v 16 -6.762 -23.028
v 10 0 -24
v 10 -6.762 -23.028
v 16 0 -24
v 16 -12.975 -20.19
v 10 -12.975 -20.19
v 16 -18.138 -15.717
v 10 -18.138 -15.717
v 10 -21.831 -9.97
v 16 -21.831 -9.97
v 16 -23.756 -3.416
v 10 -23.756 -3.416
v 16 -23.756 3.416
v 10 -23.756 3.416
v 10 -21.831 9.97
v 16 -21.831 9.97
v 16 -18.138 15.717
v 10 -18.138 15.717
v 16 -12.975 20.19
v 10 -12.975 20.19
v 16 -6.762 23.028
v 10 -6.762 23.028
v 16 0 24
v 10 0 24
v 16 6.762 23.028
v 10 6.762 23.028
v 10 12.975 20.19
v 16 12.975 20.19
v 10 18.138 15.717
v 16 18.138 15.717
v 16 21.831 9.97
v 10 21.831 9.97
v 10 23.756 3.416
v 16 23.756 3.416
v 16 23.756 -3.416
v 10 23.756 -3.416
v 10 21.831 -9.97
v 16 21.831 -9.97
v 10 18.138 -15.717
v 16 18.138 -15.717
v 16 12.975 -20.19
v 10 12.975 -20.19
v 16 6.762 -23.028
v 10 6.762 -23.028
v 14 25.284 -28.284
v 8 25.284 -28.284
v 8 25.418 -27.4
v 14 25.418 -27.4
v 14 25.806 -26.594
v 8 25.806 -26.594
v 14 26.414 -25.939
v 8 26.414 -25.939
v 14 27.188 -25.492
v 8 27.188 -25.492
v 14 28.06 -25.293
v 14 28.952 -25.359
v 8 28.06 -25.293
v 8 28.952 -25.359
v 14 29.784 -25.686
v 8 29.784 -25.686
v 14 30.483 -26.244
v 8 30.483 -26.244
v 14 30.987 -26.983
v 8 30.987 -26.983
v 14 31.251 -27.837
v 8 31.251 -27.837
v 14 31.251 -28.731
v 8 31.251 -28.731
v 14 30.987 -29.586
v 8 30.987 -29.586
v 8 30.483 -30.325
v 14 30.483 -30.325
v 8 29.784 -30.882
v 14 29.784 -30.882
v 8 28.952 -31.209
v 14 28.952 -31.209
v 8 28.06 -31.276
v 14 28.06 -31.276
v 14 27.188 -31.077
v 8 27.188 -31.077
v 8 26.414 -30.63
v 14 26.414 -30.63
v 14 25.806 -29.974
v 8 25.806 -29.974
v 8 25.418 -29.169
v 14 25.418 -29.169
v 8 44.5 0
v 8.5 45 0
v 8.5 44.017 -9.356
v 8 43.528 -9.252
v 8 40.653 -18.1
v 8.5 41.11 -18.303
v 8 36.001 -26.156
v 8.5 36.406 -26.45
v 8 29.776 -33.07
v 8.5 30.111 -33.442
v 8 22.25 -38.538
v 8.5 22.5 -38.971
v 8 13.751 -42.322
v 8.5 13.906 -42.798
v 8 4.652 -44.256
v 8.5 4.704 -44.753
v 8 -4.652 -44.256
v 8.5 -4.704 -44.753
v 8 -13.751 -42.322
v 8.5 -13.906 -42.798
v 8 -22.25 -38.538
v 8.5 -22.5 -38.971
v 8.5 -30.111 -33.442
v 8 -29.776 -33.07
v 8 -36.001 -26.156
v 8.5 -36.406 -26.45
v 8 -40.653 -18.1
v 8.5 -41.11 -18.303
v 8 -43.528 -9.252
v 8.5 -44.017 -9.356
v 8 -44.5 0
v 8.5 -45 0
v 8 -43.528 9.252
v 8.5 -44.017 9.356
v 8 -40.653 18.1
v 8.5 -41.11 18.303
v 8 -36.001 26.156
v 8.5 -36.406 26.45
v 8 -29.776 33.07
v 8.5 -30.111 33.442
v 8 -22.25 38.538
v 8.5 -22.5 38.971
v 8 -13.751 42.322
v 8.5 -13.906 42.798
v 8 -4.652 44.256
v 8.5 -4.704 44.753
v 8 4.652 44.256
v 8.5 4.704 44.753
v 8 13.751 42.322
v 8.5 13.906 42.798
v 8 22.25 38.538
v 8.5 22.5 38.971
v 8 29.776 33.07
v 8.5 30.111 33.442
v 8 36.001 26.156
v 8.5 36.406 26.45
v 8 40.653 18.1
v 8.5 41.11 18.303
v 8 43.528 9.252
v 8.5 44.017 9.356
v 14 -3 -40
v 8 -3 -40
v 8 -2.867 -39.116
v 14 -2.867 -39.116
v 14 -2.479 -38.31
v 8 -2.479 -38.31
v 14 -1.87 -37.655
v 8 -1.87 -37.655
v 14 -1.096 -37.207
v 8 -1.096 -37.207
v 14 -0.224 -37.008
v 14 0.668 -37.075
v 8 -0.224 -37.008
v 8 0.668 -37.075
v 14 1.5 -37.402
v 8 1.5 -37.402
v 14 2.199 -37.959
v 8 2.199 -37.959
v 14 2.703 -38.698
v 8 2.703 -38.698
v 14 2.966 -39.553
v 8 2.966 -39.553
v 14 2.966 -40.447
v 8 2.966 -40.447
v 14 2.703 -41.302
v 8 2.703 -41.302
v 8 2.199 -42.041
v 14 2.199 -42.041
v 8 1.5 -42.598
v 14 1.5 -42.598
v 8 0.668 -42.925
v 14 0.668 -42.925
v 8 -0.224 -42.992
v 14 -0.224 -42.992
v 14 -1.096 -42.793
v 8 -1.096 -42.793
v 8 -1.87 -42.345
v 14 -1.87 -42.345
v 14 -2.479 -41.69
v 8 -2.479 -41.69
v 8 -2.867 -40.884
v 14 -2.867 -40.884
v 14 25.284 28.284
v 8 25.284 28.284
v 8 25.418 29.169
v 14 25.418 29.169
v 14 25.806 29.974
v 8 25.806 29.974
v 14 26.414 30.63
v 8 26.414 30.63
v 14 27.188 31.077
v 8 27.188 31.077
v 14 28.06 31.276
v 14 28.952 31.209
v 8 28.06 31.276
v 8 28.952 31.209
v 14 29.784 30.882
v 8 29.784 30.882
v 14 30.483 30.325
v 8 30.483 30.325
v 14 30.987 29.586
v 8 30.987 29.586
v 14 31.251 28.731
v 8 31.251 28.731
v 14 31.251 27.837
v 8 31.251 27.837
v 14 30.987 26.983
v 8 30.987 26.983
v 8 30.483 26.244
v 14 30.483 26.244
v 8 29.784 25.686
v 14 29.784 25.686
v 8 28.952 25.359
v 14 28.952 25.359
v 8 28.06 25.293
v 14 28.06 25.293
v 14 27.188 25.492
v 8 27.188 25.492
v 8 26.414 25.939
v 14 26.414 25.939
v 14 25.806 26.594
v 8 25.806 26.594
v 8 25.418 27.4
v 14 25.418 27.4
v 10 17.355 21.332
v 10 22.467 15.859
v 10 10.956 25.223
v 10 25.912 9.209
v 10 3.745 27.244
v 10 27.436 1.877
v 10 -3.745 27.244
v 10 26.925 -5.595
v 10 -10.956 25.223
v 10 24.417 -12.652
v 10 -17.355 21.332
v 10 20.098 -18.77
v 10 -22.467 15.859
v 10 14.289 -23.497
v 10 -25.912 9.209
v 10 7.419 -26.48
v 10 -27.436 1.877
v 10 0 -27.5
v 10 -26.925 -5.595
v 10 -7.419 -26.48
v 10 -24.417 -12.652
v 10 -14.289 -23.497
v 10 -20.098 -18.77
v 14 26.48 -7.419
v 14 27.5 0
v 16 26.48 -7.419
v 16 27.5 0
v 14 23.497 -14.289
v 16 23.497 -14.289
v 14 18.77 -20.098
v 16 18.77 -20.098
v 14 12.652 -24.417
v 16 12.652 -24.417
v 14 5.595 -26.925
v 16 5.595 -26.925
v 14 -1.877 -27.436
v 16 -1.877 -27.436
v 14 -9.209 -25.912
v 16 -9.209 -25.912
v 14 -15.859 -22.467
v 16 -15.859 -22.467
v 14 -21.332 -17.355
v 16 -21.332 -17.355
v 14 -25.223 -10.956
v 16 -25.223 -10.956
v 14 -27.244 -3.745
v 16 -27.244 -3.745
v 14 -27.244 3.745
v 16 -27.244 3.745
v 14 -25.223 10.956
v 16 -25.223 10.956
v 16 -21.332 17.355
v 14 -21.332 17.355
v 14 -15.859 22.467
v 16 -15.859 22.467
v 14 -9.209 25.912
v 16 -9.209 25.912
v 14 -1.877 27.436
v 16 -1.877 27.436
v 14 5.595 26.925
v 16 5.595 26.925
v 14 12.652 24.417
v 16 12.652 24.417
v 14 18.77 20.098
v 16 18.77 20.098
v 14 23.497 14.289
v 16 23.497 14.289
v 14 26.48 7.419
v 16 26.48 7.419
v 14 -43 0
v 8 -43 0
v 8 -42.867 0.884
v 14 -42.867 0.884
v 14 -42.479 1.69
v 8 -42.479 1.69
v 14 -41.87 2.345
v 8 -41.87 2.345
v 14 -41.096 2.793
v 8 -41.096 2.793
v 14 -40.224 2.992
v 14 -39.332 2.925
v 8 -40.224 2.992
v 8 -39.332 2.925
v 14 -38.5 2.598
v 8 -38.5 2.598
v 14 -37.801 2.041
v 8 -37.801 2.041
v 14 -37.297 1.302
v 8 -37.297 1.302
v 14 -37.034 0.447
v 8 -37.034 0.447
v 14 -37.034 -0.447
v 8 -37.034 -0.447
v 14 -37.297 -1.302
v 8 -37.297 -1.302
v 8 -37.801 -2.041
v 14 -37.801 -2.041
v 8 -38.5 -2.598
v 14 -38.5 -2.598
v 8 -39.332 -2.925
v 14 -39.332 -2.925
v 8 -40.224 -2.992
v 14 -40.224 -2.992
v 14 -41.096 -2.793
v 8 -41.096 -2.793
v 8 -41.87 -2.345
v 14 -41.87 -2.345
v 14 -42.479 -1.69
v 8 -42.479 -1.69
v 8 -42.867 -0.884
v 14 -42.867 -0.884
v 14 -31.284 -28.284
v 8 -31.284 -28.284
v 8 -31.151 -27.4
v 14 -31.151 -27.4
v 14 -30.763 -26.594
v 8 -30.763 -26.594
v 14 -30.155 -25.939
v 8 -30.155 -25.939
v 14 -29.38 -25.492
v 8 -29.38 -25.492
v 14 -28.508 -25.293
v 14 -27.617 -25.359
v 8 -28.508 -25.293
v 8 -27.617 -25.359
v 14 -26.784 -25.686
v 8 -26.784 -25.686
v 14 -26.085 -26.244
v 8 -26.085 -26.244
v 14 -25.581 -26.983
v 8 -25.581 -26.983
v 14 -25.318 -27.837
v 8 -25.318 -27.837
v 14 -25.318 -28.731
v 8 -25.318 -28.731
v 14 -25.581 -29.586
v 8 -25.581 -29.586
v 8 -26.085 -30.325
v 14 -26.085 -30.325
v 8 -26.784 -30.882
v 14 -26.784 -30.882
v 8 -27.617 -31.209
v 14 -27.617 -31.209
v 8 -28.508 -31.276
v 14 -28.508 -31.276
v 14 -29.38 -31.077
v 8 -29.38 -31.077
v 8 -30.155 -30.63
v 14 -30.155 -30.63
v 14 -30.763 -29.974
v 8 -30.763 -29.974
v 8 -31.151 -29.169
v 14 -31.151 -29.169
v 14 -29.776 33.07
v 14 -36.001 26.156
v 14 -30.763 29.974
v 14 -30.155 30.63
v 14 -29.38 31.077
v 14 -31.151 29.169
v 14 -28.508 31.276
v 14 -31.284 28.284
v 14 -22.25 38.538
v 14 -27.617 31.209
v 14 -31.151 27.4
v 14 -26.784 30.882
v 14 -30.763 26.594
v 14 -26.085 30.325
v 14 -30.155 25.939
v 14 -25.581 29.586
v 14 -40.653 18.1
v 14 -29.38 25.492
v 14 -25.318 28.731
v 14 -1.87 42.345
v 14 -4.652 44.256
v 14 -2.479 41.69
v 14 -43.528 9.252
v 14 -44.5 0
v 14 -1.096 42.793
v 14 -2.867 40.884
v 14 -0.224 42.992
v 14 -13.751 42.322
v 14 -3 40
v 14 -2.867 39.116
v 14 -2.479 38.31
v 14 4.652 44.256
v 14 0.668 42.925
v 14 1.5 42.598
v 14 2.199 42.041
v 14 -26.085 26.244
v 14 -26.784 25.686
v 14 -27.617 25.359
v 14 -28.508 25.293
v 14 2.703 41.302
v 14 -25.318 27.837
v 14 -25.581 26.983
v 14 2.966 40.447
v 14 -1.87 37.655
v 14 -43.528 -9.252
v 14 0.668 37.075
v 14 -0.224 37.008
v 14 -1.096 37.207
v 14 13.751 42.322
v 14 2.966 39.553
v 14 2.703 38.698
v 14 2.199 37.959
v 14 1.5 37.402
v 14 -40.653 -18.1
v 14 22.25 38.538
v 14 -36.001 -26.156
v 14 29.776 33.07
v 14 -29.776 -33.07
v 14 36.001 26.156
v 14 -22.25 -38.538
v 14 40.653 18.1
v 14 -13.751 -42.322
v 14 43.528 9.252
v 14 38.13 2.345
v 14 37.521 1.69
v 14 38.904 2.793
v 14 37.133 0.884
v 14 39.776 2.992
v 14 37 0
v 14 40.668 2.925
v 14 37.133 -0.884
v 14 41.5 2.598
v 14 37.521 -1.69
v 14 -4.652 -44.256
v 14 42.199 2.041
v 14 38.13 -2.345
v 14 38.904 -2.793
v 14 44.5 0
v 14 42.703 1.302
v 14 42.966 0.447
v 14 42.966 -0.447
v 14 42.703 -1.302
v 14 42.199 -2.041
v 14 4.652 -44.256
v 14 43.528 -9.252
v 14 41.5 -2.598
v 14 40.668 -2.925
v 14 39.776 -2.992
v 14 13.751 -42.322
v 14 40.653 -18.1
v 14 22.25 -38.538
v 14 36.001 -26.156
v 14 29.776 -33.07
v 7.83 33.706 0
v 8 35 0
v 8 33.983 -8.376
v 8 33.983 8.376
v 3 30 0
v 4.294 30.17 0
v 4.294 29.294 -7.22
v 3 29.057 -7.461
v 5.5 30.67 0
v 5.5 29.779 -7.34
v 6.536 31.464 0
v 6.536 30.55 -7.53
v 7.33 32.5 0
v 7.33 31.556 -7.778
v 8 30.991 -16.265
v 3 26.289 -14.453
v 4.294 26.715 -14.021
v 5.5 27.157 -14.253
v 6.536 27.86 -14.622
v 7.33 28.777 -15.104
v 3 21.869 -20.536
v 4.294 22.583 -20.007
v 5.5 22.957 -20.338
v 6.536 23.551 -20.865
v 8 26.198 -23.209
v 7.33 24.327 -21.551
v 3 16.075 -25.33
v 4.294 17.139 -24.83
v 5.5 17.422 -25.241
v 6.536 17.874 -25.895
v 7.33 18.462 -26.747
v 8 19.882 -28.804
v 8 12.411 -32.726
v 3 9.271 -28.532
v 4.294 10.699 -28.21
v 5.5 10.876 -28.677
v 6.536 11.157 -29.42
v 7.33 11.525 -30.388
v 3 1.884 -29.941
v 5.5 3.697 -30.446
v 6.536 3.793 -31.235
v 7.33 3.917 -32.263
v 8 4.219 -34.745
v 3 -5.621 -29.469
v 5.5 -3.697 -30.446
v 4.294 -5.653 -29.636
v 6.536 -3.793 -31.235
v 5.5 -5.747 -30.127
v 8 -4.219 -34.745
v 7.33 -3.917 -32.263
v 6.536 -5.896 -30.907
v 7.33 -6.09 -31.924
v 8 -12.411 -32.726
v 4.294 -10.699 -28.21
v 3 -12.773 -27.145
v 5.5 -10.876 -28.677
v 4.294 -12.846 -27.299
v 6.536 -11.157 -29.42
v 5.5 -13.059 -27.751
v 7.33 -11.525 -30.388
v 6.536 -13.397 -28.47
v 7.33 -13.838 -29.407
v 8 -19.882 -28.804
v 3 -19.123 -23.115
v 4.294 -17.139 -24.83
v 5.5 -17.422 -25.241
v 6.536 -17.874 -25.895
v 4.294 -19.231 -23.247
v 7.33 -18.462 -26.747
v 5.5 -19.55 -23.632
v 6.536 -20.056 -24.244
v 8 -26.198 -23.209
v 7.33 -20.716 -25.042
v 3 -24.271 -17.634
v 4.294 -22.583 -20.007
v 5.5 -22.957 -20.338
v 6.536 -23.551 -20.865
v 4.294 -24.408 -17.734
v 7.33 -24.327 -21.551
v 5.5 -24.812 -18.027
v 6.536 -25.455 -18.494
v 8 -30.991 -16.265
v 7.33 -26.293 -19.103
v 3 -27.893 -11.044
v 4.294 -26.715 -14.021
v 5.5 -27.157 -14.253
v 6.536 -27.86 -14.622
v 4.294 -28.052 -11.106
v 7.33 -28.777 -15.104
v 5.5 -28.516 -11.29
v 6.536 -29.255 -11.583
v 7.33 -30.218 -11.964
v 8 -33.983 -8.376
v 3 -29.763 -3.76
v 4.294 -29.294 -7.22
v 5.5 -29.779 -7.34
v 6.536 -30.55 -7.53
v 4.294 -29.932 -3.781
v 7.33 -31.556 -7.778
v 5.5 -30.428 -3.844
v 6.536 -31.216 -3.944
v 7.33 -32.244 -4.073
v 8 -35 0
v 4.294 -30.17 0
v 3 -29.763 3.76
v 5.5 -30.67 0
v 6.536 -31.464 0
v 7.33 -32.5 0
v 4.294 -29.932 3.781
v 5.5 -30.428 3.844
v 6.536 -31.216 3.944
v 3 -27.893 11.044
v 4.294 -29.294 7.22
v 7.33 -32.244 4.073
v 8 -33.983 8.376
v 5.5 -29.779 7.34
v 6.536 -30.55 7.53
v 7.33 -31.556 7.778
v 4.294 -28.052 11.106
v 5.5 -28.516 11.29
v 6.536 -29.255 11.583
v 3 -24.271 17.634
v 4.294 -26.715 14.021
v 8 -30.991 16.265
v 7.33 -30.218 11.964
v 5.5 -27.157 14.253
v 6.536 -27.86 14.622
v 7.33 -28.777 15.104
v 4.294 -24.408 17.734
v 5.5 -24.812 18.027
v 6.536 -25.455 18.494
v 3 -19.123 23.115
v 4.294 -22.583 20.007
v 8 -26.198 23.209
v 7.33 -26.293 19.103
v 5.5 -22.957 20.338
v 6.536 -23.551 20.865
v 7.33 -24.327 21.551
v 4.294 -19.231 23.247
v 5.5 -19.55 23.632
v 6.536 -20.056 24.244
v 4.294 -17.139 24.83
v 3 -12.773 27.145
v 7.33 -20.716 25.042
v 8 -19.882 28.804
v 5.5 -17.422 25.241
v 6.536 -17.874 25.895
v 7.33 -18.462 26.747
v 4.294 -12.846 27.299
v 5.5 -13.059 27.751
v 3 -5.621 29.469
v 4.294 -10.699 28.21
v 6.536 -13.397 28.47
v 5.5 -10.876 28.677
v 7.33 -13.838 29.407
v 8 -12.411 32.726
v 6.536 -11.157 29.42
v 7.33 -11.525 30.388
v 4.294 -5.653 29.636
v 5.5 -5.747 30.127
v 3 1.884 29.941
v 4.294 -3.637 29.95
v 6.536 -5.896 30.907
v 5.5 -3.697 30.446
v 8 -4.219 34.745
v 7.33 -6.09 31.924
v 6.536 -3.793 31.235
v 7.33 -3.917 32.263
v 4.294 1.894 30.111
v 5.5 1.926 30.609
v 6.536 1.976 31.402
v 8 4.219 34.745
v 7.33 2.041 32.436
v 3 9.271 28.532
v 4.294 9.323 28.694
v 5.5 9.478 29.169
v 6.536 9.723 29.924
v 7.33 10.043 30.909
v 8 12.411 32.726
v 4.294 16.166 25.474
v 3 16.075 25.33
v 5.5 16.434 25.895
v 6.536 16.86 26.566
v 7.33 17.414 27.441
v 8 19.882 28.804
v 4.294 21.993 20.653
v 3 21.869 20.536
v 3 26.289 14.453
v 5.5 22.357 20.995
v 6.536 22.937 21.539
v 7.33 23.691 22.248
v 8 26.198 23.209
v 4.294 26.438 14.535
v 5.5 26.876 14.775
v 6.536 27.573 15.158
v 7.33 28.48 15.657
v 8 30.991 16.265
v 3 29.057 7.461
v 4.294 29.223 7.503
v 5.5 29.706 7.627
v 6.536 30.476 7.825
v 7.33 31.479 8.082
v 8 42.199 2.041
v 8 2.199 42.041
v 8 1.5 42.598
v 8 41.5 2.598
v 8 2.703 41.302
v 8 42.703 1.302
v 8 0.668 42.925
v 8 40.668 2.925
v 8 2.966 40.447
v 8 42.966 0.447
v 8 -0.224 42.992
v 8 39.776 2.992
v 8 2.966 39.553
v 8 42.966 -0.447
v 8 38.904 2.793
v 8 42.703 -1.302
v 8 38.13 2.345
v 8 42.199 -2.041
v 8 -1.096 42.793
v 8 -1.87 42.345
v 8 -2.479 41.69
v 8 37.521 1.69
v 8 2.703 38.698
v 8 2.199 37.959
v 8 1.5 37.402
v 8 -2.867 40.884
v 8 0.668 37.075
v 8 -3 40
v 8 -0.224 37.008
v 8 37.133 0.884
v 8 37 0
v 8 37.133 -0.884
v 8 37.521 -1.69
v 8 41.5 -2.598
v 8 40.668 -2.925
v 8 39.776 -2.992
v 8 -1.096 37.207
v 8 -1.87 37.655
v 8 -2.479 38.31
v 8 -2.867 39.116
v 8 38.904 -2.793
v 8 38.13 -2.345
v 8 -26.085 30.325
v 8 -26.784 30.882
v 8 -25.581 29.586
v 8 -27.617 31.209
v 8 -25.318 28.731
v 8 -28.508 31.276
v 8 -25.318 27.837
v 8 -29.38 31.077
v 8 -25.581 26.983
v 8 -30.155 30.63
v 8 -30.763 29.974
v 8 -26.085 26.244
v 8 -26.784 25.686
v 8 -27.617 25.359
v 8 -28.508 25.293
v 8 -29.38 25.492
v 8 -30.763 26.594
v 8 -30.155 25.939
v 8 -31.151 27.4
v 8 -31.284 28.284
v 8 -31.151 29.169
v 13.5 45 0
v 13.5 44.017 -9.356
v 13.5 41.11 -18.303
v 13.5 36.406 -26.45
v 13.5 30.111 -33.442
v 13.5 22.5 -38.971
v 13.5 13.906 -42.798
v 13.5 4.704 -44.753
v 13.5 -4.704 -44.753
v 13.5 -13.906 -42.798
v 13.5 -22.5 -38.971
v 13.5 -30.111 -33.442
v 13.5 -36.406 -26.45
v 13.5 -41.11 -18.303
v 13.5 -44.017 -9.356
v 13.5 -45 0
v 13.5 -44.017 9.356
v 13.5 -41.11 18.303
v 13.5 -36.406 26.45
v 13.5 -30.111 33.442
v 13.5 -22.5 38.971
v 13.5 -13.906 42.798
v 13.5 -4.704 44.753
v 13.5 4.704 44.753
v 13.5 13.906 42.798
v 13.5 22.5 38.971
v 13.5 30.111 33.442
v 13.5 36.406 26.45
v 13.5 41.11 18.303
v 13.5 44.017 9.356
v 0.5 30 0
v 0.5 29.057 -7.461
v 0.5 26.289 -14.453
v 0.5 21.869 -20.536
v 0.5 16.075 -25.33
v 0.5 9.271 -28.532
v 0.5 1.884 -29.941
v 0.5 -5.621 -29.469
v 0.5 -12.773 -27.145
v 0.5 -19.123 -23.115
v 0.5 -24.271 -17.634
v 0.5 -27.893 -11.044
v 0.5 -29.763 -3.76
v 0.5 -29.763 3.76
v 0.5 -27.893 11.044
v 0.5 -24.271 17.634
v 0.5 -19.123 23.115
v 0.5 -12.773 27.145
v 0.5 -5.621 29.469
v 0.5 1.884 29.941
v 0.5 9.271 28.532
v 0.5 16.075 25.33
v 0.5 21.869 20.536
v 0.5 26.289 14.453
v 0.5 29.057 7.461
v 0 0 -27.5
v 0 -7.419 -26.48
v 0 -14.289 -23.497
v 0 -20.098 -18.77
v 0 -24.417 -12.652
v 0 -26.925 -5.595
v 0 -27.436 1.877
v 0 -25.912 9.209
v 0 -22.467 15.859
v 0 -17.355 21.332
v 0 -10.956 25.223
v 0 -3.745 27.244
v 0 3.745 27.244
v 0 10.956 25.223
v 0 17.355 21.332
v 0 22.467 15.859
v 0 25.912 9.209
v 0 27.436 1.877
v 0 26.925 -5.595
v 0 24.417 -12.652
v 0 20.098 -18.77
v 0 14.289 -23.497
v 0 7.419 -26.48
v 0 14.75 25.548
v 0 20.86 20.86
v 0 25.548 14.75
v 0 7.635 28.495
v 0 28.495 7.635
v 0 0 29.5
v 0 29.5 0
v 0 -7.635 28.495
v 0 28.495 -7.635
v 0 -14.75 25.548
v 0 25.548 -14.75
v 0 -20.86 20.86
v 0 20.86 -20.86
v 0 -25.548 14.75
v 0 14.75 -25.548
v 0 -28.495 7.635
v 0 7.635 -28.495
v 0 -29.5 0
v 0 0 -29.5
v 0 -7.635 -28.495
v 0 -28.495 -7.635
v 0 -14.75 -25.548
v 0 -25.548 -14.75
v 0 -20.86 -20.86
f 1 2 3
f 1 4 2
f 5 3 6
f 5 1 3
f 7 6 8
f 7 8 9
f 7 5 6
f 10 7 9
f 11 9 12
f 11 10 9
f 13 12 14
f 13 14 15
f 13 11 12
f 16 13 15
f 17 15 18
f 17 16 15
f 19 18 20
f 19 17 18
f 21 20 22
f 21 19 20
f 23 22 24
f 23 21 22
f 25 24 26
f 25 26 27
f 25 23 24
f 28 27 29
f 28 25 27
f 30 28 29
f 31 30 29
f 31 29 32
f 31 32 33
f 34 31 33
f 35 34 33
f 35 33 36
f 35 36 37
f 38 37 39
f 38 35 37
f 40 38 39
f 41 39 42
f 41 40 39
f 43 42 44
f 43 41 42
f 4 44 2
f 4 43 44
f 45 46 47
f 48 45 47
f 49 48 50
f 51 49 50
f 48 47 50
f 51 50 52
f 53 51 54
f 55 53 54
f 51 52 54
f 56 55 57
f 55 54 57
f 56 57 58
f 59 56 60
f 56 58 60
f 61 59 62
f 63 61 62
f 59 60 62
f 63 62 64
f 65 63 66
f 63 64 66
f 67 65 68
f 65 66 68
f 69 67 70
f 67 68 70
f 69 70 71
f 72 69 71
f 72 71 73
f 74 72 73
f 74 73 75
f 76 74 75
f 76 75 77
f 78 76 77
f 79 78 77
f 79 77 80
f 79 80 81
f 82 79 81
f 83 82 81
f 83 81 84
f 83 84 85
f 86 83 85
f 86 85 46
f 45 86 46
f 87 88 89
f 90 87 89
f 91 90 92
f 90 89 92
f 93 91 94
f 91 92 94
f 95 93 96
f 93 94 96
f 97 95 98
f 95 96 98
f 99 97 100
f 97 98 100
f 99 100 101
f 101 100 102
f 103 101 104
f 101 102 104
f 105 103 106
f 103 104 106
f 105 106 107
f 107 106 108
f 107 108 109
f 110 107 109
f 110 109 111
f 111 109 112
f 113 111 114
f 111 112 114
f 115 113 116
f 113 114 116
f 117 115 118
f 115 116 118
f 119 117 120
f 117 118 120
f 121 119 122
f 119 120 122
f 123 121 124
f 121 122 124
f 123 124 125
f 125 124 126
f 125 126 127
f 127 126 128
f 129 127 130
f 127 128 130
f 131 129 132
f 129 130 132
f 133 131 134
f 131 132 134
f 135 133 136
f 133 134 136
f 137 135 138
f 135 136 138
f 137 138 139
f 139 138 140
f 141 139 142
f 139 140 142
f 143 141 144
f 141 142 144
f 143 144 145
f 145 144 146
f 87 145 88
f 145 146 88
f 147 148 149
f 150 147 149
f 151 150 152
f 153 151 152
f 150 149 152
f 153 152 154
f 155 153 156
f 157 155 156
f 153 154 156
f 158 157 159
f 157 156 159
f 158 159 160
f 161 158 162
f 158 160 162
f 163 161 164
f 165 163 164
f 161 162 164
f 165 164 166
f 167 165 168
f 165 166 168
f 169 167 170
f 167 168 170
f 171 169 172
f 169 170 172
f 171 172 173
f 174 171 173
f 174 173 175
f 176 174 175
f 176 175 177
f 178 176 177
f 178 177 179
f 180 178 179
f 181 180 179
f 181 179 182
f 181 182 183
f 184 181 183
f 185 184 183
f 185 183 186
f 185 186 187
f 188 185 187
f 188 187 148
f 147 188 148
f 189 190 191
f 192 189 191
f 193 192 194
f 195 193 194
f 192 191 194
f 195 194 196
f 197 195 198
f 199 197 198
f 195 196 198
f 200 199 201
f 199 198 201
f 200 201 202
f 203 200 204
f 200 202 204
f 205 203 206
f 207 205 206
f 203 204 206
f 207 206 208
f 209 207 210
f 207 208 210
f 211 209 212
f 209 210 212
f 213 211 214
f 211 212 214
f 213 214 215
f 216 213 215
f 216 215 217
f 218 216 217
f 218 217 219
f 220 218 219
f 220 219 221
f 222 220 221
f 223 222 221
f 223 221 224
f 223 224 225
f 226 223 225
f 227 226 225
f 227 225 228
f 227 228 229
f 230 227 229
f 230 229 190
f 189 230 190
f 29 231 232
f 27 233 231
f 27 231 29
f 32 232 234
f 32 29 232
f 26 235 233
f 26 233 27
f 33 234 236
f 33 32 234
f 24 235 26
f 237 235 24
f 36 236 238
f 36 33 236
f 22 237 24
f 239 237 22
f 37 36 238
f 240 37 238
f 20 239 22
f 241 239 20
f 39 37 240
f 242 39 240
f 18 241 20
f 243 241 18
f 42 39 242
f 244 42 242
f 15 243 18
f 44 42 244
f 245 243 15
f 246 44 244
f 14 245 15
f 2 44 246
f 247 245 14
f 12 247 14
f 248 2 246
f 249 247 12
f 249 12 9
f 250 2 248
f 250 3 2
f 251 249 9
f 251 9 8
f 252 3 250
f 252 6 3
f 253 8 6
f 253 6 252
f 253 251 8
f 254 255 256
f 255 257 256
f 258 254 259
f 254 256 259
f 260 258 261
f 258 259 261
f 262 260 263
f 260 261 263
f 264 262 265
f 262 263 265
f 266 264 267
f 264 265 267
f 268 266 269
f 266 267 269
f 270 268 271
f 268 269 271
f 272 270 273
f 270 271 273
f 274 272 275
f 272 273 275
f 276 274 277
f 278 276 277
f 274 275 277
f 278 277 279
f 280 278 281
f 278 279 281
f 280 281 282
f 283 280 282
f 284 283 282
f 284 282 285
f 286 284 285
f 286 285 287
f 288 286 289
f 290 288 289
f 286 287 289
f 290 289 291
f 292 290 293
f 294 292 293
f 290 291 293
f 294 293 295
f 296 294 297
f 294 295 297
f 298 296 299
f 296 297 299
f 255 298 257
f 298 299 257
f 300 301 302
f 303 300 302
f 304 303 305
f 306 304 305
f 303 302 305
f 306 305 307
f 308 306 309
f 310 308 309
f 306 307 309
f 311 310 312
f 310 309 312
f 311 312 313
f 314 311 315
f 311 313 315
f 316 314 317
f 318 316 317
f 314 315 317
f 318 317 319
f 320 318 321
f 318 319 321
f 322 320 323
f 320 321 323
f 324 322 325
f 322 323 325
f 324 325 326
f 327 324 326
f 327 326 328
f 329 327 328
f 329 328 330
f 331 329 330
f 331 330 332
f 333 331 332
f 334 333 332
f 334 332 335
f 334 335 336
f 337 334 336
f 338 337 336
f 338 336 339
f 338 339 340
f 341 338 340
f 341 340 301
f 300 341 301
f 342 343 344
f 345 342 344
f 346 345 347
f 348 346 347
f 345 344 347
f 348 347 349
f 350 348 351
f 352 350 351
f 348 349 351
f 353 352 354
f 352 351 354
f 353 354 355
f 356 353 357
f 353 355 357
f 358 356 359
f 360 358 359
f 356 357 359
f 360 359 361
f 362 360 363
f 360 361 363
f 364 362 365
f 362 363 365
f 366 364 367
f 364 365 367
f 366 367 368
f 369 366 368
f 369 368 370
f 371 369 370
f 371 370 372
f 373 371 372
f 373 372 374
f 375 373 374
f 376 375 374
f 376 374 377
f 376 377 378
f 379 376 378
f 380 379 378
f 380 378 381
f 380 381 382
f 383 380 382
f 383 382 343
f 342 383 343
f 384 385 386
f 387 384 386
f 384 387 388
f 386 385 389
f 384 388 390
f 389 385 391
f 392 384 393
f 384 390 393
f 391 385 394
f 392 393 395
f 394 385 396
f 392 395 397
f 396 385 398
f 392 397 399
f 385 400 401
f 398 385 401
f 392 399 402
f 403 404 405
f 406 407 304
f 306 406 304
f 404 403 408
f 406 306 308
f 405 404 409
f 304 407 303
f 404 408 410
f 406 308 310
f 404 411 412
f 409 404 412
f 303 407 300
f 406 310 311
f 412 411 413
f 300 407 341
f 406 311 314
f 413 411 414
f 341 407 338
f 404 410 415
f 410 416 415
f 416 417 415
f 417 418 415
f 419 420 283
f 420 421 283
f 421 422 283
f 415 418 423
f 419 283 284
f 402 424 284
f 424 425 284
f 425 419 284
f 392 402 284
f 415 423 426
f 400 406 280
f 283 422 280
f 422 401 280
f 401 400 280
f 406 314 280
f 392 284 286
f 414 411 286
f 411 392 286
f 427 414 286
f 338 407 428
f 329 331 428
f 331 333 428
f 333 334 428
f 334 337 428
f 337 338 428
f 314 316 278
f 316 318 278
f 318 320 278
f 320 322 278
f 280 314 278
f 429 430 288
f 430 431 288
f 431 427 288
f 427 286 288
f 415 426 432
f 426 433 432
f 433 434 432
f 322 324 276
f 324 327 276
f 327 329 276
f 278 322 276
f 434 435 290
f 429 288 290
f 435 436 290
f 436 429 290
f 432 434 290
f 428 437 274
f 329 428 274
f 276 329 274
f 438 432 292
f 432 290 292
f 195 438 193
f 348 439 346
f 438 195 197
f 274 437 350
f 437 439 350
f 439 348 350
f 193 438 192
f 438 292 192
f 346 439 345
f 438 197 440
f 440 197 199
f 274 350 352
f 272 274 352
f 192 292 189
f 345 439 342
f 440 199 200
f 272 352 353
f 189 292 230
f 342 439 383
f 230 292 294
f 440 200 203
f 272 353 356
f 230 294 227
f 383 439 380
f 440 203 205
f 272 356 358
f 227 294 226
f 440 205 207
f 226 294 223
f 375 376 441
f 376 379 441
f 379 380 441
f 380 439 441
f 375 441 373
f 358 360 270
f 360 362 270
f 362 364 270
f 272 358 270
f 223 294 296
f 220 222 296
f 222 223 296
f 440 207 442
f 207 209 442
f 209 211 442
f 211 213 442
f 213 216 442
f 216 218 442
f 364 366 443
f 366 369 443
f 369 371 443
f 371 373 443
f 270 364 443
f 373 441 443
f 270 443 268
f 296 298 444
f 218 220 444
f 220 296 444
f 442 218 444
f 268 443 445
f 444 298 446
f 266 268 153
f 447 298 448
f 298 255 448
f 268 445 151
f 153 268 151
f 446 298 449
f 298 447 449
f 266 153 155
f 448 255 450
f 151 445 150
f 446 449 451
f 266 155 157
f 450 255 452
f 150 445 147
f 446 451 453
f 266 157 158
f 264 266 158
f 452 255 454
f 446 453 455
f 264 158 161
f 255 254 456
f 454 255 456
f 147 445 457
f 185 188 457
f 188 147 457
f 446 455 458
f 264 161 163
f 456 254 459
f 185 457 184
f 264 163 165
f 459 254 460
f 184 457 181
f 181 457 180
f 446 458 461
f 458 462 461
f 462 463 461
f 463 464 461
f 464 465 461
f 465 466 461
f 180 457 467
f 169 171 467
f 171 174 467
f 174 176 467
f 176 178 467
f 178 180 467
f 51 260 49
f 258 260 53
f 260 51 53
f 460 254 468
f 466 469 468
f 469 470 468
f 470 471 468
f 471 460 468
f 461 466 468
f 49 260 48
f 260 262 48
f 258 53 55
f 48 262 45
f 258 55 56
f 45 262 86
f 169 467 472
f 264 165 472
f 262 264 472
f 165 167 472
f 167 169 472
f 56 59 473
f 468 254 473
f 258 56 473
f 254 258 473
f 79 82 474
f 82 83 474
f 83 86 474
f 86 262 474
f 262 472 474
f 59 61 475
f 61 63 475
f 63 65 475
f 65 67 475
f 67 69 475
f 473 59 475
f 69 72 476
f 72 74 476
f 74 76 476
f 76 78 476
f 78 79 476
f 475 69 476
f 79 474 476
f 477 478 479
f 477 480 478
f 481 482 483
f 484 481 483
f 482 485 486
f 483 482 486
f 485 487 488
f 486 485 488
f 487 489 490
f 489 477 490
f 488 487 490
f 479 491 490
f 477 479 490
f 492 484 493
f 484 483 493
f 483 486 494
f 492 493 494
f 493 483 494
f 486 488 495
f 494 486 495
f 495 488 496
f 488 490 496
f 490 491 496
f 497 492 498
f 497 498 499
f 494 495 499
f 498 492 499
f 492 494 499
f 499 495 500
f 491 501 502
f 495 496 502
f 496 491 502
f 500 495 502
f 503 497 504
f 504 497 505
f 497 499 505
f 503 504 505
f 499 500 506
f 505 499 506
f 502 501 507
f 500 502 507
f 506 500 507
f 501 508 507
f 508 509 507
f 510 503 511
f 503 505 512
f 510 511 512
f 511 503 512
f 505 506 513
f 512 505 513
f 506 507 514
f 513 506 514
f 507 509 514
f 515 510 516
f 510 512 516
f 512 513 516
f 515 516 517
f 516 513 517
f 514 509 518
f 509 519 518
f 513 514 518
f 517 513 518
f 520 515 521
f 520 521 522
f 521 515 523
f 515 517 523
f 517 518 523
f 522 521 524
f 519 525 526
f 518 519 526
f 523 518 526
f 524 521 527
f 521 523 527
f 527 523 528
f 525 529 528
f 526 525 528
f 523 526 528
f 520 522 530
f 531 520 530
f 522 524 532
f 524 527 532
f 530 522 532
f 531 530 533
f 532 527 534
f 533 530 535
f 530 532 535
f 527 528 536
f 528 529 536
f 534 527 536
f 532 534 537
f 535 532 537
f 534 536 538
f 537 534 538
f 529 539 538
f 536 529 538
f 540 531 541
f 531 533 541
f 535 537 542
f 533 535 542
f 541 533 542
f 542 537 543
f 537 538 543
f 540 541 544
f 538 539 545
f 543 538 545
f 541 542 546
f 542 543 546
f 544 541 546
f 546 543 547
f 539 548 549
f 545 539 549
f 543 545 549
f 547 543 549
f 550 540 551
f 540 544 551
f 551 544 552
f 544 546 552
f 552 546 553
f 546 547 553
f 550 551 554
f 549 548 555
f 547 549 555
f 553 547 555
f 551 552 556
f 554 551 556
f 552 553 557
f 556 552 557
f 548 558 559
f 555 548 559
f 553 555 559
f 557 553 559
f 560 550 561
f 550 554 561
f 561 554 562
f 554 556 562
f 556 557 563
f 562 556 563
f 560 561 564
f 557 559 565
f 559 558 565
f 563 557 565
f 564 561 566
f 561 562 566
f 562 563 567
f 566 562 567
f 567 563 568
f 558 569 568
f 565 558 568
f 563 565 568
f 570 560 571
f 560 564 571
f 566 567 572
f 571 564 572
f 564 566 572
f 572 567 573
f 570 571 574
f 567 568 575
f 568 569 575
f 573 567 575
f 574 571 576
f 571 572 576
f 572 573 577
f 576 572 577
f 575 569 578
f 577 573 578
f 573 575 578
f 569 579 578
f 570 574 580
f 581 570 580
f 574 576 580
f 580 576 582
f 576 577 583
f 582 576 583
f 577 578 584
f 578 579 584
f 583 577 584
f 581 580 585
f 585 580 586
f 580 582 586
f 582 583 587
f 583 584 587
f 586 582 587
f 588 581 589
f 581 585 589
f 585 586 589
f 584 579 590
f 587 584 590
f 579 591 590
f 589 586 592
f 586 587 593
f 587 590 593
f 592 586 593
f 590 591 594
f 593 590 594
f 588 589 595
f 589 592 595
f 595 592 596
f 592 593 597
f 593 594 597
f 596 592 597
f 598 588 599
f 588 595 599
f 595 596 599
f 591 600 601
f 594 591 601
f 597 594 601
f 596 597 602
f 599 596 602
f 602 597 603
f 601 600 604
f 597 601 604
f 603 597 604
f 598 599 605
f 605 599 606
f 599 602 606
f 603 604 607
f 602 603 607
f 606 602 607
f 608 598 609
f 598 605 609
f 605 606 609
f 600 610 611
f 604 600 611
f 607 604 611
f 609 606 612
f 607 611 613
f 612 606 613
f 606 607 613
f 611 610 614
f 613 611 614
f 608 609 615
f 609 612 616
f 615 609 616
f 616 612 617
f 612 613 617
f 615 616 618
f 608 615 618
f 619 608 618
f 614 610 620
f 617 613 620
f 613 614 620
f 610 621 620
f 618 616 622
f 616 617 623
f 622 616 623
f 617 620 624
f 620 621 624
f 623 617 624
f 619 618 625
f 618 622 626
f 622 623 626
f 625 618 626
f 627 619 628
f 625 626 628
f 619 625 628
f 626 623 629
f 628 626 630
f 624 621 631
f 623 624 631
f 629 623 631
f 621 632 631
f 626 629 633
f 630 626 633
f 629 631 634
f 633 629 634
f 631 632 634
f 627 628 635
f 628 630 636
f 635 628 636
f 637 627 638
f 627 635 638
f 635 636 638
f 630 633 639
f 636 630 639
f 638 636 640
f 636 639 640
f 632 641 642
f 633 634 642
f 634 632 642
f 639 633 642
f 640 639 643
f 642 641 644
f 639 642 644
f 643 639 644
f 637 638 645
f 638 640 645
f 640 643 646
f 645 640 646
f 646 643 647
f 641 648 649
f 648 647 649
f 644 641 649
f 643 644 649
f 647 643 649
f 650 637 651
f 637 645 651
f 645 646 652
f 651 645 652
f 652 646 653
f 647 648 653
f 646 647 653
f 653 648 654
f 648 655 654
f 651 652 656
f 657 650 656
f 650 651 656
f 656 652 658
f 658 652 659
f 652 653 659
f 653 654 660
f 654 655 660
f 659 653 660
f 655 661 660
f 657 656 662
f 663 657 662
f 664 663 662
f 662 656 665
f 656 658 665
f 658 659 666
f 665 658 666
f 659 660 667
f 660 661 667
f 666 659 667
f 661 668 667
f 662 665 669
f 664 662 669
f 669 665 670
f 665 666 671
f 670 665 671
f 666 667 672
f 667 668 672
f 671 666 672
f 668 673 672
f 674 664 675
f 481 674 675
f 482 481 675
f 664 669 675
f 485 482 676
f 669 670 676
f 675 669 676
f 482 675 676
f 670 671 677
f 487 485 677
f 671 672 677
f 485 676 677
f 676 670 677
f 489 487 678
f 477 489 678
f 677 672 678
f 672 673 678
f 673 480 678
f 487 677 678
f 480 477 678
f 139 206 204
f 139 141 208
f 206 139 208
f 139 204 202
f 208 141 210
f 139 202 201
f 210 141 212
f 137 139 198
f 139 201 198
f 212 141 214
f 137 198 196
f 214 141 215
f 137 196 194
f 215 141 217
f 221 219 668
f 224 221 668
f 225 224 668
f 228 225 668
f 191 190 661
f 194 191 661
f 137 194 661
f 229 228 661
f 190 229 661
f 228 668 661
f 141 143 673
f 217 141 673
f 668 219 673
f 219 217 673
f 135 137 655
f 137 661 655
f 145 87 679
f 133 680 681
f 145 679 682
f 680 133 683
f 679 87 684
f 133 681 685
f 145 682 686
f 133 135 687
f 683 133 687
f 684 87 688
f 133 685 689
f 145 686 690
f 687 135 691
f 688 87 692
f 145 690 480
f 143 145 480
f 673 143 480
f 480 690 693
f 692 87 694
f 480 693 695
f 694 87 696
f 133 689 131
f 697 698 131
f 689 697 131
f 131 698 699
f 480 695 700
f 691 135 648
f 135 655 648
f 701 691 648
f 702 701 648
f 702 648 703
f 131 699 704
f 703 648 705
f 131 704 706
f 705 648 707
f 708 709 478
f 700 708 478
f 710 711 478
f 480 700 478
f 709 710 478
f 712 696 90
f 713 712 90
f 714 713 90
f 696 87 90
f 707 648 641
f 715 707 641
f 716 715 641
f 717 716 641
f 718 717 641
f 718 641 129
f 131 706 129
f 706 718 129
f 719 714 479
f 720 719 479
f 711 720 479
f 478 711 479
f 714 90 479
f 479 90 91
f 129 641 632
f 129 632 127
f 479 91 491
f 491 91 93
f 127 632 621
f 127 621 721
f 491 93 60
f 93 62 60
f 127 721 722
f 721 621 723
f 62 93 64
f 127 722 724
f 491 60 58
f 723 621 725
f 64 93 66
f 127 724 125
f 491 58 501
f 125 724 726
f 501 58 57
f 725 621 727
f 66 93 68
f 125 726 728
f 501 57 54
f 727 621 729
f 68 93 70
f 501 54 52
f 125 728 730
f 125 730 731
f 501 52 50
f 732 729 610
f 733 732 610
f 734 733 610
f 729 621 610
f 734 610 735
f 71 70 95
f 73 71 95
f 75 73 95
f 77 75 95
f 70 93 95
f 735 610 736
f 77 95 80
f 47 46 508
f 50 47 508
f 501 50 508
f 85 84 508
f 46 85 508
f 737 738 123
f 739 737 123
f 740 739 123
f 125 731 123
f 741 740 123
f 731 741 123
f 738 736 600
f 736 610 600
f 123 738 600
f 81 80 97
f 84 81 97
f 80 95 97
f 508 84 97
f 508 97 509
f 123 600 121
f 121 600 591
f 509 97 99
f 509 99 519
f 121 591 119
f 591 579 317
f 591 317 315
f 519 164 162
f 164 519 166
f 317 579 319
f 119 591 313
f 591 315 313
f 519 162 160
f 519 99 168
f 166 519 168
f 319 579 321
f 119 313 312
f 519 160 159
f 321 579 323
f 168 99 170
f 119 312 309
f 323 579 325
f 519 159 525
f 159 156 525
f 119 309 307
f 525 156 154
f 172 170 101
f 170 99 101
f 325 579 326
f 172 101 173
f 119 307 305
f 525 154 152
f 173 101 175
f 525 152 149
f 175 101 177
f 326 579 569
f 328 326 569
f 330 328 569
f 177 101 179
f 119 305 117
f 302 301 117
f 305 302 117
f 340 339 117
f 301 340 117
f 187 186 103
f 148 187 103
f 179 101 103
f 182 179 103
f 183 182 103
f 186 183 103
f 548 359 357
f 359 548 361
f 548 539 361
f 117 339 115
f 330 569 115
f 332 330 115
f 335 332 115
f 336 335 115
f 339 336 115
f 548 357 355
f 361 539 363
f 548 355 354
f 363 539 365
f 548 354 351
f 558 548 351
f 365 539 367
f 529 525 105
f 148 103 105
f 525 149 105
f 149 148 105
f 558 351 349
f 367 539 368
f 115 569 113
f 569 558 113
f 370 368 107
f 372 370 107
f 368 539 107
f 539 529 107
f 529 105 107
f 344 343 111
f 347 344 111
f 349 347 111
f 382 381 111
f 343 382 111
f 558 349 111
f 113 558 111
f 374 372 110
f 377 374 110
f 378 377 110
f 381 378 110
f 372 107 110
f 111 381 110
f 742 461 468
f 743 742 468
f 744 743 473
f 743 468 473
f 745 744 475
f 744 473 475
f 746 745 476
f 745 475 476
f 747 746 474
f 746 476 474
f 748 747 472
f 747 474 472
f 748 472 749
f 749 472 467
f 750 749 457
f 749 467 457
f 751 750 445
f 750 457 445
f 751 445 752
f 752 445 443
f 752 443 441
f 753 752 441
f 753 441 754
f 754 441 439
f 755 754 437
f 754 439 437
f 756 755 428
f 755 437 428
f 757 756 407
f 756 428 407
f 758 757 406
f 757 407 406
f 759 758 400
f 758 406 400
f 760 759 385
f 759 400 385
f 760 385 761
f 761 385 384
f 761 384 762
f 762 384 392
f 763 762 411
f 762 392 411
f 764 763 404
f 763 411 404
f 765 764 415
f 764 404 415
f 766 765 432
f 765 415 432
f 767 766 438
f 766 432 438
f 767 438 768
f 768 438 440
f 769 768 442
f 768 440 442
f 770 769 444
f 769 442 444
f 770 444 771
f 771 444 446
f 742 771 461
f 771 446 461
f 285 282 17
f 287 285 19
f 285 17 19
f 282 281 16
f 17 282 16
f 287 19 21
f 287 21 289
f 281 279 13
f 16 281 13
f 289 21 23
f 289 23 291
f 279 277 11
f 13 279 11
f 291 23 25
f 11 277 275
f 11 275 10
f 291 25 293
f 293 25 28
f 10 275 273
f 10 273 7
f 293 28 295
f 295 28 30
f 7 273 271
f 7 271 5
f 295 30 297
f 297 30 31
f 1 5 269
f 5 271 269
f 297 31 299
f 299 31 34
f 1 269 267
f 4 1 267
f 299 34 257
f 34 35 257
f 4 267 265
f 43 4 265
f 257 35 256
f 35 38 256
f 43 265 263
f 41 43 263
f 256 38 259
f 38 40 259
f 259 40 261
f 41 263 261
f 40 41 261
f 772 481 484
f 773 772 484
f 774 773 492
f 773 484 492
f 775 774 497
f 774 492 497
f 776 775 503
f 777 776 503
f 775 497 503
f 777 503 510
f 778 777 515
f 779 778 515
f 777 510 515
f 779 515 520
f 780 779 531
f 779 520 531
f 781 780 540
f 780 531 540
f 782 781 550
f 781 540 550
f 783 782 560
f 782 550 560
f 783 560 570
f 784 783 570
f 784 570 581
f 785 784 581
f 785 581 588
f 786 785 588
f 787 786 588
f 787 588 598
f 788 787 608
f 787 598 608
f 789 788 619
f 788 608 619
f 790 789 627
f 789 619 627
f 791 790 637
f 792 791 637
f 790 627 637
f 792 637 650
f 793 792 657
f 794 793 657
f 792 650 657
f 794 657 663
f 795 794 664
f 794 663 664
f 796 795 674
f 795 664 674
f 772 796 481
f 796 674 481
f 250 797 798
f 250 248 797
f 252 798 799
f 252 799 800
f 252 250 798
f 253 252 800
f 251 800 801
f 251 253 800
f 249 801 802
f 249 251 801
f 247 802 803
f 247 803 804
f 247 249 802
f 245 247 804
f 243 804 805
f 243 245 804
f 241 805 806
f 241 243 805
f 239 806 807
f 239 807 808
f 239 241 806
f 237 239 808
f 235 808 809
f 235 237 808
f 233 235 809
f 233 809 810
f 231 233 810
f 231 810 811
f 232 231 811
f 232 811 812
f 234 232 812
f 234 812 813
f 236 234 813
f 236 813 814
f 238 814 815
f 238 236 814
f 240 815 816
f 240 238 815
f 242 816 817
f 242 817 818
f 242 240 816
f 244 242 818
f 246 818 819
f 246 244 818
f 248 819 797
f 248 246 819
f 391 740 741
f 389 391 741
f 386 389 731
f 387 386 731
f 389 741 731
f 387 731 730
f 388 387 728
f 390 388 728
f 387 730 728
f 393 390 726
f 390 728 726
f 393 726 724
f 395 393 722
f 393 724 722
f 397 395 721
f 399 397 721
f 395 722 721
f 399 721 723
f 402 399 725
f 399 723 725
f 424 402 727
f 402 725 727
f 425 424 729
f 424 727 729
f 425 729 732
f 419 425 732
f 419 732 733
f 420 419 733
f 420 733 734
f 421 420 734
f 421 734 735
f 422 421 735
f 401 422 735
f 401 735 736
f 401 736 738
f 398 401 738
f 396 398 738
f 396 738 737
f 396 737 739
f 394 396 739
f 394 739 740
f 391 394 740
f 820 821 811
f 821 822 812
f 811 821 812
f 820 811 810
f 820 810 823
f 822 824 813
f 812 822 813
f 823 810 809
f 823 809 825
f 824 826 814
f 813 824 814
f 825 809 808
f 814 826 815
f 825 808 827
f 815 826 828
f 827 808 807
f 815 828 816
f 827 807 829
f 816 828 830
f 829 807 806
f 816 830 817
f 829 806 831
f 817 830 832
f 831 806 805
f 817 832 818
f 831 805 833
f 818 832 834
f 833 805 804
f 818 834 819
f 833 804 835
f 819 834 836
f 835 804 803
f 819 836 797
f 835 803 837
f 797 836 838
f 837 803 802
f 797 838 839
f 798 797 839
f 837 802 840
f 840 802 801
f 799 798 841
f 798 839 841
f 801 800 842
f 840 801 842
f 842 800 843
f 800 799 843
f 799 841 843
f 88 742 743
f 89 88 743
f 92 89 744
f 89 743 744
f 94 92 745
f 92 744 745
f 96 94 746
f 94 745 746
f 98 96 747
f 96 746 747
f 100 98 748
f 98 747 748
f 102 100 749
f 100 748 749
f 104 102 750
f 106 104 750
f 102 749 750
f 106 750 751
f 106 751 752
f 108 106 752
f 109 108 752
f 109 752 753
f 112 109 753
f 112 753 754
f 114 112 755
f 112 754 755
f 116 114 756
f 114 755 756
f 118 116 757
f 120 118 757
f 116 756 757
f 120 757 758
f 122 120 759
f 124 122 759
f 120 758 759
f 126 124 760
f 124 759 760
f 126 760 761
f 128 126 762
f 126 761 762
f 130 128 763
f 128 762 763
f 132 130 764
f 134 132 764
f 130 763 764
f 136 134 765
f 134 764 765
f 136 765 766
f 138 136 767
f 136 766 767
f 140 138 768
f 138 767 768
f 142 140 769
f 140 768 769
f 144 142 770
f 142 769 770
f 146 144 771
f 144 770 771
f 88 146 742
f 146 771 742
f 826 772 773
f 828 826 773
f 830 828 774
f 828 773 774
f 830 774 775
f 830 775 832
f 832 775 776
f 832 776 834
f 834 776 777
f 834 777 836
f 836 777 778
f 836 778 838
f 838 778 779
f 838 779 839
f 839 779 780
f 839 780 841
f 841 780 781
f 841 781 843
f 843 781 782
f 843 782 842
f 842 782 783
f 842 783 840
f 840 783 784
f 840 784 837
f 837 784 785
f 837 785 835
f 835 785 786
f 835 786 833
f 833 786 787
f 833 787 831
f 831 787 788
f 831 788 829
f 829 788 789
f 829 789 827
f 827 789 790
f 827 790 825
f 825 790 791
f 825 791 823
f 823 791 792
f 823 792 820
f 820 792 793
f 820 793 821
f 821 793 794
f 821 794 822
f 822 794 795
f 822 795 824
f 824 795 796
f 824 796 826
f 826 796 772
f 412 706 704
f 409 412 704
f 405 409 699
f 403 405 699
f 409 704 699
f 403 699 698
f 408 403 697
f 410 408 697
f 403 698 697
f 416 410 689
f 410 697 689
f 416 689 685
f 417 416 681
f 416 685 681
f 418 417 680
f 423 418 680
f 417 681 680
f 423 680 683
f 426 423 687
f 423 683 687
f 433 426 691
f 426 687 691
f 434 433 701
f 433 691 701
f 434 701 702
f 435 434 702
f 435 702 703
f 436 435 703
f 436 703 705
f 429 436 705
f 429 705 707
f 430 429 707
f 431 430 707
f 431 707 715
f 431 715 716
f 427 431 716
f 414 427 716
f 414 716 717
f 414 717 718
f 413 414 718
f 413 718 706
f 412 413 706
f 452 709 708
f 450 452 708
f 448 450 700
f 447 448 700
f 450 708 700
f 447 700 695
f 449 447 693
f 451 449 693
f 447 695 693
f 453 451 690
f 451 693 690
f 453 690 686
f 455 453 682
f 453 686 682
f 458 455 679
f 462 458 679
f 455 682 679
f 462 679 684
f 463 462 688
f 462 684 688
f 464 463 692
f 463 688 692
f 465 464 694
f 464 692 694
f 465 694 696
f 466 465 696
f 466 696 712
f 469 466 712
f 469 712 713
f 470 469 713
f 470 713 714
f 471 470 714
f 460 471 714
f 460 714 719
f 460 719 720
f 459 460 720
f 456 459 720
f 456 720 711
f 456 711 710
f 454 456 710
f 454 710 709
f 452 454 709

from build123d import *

# Parameters (mm, degrees)
SKETCH_3_R          = 3
CUT_EXTRUDE_1_DEPTH = 10
CHAMFER_1_SIZE      = 0.5
FILLET_1_R          = 5


with BuildPart() as part:
    # 草图1 → 旋转1 (revolve)
    with BuildSketch(Plane.XY):
        Polygon((0, 0), (0, 30), (8, 30), (8, 45), (14, 45), (14, 27.5), (16, 27.5), (16, 0), align=None)
    revolve(axis=Axis((16, 0, 0), (-1, 0, 0)))

    # 草图2 → 切除-旋转1 (revolve, cut)
    with BuildSketch(Plane.XY, mode=Mode.PRIVATE) as cut_revolve_1_sk:
        Polygon((0, 0), (0, 27.5), (10, 27.5), (10, 24), (16, 24), (16, 0), align=None)
    revolve(cut_revolve_1_sk.sketch.rotate(Axis((16, 0, 0), (-1, 0, 0)), 90), axis=Axis((16, 0, 0), (-1, 0, 0)), mode=Mode.SUBTRACT)

    # 草图3 → 切除-拉伸1 (cut)
    with BuildSketch(Plane.ZY.offset(-8)):
        with Locations(Location((0, 40, 0), (0, 0, 270))):
            Circle(SKETCH_3_R)
        with Locations(Location((28.284271247, 28.284271247, 0), (0, 0, 270))):
            Circle(SKETCH_3_R)
        with Locations(Location((40, 0, 0), (0, 0, 270))):
            Circle(SKETCH_3_R)
        with Locations(Location((28.284271247, -28.284271247, 0), (0, 0, 270))):
            Circle(SKETCH_3_R)
        with Locations(Location((0, -40, 0), (0, 0, 270))):
            Circle(SKETCH_3_R)
        with Locations(Location((-28.284271247, -28.284271247, 0), (0, 0, 270))):
            Circle(SKETCH_3_R)
        with Locations(Location((-40, 0, 0), (0, 0, 270))):
            Circle(SKETCH_3_R)
        with Locations(Location((-28.284271247, 28.284271247, 0), (0, 0, 270))):
            Circle(SKETCH_3_R)
    extrude(amount=-CUT_EXTRUDE_1_DEPTH, mode=Mode.SUBTRACT)

    # 倒角1
    chamfer_1_edges = [part.edges().sort_by_distance(p)[0] for p in [
        (14, -45, 0),
        (8, -45, 0),
        (0, -30, 0),
    ]]
    chamfer(chamfer_1_edges, length=CHAMFER_1_SIZE)

    # 圆角1
    fillet_1_edges = [part.edges().sort_by_distance(p)[0] for p in [
        (8, -30, 0),
    ]]
    fillet(fillet_1_edges, radius=FILLET_1_R)


solid = part.part
